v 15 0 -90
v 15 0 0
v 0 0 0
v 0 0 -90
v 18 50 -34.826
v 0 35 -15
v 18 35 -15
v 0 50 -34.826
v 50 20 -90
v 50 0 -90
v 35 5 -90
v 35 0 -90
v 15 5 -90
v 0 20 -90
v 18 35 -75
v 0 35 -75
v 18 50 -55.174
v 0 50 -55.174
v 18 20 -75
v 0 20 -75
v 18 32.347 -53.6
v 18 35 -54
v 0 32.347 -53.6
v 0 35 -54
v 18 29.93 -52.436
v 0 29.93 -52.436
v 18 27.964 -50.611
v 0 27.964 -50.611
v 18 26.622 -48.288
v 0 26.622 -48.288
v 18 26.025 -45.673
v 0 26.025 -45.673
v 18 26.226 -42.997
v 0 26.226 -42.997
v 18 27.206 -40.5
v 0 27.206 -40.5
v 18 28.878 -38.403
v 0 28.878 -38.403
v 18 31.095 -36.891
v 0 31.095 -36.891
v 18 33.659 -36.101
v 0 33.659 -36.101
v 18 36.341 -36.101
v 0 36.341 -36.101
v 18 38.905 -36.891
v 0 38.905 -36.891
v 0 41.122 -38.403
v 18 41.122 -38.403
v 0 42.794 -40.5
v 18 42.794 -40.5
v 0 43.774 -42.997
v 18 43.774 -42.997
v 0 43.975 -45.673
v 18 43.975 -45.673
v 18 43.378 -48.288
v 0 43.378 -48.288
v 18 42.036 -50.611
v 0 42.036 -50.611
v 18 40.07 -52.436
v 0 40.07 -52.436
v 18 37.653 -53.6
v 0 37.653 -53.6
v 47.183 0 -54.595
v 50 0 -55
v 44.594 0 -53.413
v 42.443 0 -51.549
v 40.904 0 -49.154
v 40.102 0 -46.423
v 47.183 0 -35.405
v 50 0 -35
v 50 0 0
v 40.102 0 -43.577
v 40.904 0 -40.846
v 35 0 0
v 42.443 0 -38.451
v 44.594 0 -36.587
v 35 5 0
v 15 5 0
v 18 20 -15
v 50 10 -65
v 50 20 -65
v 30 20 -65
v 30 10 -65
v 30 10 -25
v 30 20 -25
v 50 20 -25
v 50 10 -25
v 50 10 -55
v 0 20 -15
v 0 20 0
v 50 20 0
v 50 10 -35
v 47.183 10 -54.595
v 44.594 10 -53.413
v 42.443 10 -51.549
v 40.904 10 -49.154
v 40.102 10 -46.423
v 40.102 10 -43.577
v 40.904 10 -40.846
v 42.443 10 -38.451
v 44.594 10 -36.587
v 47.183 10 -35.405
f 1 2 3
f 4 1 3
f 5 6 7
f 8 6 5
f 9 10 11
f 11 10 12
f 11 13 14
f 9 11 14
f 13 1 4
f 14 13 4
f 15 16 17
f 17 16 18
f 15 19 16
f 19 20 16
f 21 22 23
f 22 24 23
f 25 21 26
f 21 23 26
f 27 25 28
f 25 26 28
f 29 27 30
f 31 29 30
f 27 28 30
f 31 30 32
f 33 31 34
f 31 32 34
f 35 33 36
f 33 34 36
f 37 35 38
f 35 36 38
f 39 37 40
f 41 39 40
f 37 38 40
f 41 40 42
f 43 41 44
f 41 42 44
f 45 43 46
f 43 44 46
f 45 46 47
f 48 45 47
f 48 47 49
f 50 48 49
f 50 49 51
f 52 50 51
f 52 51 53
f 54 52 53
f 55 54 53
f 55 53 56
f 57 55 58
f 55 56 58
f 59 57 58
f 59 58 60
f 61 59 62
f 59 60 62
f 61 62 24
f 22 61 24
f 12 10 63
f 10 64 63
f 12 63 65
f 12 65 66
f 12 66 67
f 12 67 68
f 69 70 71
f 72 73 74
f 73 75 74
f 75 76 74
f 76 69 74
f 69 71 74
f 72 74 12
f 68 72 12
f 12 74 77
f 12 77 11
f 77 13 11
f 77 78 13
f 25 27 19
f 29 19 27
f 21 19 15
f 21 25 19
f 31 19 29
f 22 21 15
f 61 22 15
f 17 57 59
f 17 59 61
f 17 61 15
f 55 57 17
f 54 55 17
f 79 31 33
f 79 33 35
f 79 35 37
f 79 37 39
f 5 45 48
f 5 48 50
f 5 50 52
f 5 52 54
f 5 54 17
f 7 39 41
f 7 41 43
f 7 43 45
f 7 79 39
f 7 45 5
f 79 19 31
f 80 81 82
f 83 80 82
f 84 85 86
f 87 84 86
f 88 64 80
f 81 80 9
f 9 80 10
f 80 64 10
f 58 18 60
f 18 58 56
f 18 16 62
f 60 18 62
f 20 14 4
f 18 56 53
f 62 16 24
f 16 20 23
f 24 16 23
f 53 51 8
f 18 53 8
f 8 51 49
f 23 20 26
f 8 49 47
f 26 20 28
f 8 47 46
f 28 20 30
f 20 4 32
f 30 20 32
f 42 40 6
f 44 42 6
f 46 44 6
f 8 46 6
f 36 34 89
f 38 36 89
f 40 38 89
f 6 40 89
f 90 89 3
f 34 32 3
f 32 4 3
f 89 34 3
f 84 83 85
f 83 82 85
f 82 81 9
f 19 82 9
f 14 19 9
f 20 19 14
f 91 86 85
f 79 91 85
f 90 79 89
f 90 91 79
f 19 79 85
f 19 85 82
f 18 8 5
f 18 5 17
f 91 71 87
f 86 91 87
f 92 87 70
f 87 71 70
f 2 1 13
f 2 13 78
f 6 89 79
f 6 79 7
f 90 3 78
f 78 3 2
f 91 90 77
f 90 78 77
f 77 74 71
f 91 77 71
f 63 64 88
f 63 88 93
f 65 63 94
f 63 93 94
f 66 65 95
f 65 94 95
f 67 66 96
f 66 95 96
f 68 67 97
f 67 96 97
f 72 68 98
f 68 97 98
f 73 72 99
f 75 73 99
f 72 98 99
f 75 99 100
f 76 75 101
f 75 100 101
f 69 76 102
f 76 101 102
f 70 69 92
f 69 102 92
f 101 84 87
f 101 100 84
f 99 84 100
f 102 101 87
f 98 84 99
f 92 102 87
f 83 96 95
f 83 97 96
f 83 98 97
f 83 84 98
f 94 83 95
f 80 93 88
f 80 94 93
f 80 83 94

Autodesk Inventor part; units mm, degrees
ref_plane "YZ Plane" through (0, 0, 0) normal (1, 0, 0) x (0, 1, 0)
ref_plane "XZ Plane" through (0, 0, 0) normal (0, 1, 0) x (-1, 0, 0)
ref_plane "XY Plane" through (0, 0, 0) normal (0, 0, 1) x (1, 0, 0)
sketch "Szkic1" plane through (0, 0, 0) normal (0, 1, 0) x (-1, 0, 0)
  line L0 (0, 0) -> (-50, 0)
  line L1 (-50, 0) -> (-50, -90)
  line L2 (-50, -90) -> (0, -90)
  line L3 (0, -90) -> (0, 0)
  dimension "d0" = 50
  dimension "d1" = 90
extrude "Wyciągnięcie proste1" add sketch "Szkic1" along normal blind 20
sketch "Szkic2" plane through (0, 20, 0) normal (0, 1, 0) x (1, 0, 0)
  line L0 (50, 0) -> (50, 90) projected
  line L1 (50, 65) -> (30, 65)
  line L2 (30, 65) -> (30, 25)
  line L3 (30, 25) -> (50, 25)
  line L4 (50, 25) -> (50, 65)
  line L5 (50, 90) -> (0, 90) projected
  point P0 (0, 0)
  dimension "d4" = 20
  dimension "d5" = 40
  dimension "d6" = 25
extrude "Wyciągnięcie proste2" cut sketch "Szkic2" against normal blind 10
sketch "Szkic3" plane through (0, 10, 0) normal (0, 1, 0) x (1, 0, 0)
  line L0 (50, 65) -> (50, 25) projected
  circle A0 centre (50, 45) radius 10
  point P0 (0, 0)
  point P1 (50, 35)
  point P2 (50, 55)
  dimension "d9" = 20
extrude "Wyciągnięcie proste3" cut sketch "Szkic3" against normal through all contours L0 A0 picked at (46.1942, 47.495)
sketch "Szkic4" plane through (0, 0, 0) normal (0, -1, 0) x (1, 0, 0)
  line L0 (0, 0) -> (50, 0) projected
  line L1 (50, -90) -> (0, -90) projected
  line L2 (15, 0) -> (35, 0)
  line L3 (35, 0) -> (35, -90)
  line L4 (35, -90) -> (15, -90)
  line L5 (15, -90) -> (15, 0)
  line L6 (0, -90) -> (0, 0) projected
  dimension "d12" = 20
  dimension "d13" = 15
extrude "Wyciągnięcie proste4" cut sketch "Szkic4" against normal blind 5 contours L0 L3 L1 L5
sketch "Szkic5" plane through (0, 0, 0) normal (1, 0, 0) x (0, 1, 0)
  line L0 (20, -65) -> (20, -90) projected
  line L1 (20, -75) -> (35, -75)
  line L2 (35, -75) -> (50, -55.1735)
  line L3 (50, -55.1735) -> (50, -45.1735)
  line L4 (20, -25) -> (20, -65) projected
  line L5 (20, -15) -> (35, -15)
  line L6 (35, -15) -> (50, -34.8265)
  line L7 (50, -34.8265) -> (50, -44.8265)
  line L8 (20, -75) -> (20, -15)
  line L9 (20, -90) -> (20, 0) projected
  line L10 (50, -55.1735) -> (50, -34.8265)
  point P0 (0, 0)
  dimension "d16" = 15
  dimension "d17" = 10
  dimension "d18" = 15
extrude "Wyciągnięcie proste5" add sketch "Szkic5" along normal blind 18
sketch "Szkic6" plane through (18, 0, 0) normal (1, 0, 0) x (0, 0, -1)
  line L0 (25, 20) -> (65, 20) projected
  line L1 (15, 35) -> (15, 20) projected
  point P0 (0, 0)
  point P1 (45, 35)
  point P2 (45, 20)
  point P3 (15, 27.5)
  dimension "d21" = 15
  dimension "d22" = 30
hole "Otwór1" at (18, 35, -45) direction (-1, 0, 0) diameter 18 end through all
